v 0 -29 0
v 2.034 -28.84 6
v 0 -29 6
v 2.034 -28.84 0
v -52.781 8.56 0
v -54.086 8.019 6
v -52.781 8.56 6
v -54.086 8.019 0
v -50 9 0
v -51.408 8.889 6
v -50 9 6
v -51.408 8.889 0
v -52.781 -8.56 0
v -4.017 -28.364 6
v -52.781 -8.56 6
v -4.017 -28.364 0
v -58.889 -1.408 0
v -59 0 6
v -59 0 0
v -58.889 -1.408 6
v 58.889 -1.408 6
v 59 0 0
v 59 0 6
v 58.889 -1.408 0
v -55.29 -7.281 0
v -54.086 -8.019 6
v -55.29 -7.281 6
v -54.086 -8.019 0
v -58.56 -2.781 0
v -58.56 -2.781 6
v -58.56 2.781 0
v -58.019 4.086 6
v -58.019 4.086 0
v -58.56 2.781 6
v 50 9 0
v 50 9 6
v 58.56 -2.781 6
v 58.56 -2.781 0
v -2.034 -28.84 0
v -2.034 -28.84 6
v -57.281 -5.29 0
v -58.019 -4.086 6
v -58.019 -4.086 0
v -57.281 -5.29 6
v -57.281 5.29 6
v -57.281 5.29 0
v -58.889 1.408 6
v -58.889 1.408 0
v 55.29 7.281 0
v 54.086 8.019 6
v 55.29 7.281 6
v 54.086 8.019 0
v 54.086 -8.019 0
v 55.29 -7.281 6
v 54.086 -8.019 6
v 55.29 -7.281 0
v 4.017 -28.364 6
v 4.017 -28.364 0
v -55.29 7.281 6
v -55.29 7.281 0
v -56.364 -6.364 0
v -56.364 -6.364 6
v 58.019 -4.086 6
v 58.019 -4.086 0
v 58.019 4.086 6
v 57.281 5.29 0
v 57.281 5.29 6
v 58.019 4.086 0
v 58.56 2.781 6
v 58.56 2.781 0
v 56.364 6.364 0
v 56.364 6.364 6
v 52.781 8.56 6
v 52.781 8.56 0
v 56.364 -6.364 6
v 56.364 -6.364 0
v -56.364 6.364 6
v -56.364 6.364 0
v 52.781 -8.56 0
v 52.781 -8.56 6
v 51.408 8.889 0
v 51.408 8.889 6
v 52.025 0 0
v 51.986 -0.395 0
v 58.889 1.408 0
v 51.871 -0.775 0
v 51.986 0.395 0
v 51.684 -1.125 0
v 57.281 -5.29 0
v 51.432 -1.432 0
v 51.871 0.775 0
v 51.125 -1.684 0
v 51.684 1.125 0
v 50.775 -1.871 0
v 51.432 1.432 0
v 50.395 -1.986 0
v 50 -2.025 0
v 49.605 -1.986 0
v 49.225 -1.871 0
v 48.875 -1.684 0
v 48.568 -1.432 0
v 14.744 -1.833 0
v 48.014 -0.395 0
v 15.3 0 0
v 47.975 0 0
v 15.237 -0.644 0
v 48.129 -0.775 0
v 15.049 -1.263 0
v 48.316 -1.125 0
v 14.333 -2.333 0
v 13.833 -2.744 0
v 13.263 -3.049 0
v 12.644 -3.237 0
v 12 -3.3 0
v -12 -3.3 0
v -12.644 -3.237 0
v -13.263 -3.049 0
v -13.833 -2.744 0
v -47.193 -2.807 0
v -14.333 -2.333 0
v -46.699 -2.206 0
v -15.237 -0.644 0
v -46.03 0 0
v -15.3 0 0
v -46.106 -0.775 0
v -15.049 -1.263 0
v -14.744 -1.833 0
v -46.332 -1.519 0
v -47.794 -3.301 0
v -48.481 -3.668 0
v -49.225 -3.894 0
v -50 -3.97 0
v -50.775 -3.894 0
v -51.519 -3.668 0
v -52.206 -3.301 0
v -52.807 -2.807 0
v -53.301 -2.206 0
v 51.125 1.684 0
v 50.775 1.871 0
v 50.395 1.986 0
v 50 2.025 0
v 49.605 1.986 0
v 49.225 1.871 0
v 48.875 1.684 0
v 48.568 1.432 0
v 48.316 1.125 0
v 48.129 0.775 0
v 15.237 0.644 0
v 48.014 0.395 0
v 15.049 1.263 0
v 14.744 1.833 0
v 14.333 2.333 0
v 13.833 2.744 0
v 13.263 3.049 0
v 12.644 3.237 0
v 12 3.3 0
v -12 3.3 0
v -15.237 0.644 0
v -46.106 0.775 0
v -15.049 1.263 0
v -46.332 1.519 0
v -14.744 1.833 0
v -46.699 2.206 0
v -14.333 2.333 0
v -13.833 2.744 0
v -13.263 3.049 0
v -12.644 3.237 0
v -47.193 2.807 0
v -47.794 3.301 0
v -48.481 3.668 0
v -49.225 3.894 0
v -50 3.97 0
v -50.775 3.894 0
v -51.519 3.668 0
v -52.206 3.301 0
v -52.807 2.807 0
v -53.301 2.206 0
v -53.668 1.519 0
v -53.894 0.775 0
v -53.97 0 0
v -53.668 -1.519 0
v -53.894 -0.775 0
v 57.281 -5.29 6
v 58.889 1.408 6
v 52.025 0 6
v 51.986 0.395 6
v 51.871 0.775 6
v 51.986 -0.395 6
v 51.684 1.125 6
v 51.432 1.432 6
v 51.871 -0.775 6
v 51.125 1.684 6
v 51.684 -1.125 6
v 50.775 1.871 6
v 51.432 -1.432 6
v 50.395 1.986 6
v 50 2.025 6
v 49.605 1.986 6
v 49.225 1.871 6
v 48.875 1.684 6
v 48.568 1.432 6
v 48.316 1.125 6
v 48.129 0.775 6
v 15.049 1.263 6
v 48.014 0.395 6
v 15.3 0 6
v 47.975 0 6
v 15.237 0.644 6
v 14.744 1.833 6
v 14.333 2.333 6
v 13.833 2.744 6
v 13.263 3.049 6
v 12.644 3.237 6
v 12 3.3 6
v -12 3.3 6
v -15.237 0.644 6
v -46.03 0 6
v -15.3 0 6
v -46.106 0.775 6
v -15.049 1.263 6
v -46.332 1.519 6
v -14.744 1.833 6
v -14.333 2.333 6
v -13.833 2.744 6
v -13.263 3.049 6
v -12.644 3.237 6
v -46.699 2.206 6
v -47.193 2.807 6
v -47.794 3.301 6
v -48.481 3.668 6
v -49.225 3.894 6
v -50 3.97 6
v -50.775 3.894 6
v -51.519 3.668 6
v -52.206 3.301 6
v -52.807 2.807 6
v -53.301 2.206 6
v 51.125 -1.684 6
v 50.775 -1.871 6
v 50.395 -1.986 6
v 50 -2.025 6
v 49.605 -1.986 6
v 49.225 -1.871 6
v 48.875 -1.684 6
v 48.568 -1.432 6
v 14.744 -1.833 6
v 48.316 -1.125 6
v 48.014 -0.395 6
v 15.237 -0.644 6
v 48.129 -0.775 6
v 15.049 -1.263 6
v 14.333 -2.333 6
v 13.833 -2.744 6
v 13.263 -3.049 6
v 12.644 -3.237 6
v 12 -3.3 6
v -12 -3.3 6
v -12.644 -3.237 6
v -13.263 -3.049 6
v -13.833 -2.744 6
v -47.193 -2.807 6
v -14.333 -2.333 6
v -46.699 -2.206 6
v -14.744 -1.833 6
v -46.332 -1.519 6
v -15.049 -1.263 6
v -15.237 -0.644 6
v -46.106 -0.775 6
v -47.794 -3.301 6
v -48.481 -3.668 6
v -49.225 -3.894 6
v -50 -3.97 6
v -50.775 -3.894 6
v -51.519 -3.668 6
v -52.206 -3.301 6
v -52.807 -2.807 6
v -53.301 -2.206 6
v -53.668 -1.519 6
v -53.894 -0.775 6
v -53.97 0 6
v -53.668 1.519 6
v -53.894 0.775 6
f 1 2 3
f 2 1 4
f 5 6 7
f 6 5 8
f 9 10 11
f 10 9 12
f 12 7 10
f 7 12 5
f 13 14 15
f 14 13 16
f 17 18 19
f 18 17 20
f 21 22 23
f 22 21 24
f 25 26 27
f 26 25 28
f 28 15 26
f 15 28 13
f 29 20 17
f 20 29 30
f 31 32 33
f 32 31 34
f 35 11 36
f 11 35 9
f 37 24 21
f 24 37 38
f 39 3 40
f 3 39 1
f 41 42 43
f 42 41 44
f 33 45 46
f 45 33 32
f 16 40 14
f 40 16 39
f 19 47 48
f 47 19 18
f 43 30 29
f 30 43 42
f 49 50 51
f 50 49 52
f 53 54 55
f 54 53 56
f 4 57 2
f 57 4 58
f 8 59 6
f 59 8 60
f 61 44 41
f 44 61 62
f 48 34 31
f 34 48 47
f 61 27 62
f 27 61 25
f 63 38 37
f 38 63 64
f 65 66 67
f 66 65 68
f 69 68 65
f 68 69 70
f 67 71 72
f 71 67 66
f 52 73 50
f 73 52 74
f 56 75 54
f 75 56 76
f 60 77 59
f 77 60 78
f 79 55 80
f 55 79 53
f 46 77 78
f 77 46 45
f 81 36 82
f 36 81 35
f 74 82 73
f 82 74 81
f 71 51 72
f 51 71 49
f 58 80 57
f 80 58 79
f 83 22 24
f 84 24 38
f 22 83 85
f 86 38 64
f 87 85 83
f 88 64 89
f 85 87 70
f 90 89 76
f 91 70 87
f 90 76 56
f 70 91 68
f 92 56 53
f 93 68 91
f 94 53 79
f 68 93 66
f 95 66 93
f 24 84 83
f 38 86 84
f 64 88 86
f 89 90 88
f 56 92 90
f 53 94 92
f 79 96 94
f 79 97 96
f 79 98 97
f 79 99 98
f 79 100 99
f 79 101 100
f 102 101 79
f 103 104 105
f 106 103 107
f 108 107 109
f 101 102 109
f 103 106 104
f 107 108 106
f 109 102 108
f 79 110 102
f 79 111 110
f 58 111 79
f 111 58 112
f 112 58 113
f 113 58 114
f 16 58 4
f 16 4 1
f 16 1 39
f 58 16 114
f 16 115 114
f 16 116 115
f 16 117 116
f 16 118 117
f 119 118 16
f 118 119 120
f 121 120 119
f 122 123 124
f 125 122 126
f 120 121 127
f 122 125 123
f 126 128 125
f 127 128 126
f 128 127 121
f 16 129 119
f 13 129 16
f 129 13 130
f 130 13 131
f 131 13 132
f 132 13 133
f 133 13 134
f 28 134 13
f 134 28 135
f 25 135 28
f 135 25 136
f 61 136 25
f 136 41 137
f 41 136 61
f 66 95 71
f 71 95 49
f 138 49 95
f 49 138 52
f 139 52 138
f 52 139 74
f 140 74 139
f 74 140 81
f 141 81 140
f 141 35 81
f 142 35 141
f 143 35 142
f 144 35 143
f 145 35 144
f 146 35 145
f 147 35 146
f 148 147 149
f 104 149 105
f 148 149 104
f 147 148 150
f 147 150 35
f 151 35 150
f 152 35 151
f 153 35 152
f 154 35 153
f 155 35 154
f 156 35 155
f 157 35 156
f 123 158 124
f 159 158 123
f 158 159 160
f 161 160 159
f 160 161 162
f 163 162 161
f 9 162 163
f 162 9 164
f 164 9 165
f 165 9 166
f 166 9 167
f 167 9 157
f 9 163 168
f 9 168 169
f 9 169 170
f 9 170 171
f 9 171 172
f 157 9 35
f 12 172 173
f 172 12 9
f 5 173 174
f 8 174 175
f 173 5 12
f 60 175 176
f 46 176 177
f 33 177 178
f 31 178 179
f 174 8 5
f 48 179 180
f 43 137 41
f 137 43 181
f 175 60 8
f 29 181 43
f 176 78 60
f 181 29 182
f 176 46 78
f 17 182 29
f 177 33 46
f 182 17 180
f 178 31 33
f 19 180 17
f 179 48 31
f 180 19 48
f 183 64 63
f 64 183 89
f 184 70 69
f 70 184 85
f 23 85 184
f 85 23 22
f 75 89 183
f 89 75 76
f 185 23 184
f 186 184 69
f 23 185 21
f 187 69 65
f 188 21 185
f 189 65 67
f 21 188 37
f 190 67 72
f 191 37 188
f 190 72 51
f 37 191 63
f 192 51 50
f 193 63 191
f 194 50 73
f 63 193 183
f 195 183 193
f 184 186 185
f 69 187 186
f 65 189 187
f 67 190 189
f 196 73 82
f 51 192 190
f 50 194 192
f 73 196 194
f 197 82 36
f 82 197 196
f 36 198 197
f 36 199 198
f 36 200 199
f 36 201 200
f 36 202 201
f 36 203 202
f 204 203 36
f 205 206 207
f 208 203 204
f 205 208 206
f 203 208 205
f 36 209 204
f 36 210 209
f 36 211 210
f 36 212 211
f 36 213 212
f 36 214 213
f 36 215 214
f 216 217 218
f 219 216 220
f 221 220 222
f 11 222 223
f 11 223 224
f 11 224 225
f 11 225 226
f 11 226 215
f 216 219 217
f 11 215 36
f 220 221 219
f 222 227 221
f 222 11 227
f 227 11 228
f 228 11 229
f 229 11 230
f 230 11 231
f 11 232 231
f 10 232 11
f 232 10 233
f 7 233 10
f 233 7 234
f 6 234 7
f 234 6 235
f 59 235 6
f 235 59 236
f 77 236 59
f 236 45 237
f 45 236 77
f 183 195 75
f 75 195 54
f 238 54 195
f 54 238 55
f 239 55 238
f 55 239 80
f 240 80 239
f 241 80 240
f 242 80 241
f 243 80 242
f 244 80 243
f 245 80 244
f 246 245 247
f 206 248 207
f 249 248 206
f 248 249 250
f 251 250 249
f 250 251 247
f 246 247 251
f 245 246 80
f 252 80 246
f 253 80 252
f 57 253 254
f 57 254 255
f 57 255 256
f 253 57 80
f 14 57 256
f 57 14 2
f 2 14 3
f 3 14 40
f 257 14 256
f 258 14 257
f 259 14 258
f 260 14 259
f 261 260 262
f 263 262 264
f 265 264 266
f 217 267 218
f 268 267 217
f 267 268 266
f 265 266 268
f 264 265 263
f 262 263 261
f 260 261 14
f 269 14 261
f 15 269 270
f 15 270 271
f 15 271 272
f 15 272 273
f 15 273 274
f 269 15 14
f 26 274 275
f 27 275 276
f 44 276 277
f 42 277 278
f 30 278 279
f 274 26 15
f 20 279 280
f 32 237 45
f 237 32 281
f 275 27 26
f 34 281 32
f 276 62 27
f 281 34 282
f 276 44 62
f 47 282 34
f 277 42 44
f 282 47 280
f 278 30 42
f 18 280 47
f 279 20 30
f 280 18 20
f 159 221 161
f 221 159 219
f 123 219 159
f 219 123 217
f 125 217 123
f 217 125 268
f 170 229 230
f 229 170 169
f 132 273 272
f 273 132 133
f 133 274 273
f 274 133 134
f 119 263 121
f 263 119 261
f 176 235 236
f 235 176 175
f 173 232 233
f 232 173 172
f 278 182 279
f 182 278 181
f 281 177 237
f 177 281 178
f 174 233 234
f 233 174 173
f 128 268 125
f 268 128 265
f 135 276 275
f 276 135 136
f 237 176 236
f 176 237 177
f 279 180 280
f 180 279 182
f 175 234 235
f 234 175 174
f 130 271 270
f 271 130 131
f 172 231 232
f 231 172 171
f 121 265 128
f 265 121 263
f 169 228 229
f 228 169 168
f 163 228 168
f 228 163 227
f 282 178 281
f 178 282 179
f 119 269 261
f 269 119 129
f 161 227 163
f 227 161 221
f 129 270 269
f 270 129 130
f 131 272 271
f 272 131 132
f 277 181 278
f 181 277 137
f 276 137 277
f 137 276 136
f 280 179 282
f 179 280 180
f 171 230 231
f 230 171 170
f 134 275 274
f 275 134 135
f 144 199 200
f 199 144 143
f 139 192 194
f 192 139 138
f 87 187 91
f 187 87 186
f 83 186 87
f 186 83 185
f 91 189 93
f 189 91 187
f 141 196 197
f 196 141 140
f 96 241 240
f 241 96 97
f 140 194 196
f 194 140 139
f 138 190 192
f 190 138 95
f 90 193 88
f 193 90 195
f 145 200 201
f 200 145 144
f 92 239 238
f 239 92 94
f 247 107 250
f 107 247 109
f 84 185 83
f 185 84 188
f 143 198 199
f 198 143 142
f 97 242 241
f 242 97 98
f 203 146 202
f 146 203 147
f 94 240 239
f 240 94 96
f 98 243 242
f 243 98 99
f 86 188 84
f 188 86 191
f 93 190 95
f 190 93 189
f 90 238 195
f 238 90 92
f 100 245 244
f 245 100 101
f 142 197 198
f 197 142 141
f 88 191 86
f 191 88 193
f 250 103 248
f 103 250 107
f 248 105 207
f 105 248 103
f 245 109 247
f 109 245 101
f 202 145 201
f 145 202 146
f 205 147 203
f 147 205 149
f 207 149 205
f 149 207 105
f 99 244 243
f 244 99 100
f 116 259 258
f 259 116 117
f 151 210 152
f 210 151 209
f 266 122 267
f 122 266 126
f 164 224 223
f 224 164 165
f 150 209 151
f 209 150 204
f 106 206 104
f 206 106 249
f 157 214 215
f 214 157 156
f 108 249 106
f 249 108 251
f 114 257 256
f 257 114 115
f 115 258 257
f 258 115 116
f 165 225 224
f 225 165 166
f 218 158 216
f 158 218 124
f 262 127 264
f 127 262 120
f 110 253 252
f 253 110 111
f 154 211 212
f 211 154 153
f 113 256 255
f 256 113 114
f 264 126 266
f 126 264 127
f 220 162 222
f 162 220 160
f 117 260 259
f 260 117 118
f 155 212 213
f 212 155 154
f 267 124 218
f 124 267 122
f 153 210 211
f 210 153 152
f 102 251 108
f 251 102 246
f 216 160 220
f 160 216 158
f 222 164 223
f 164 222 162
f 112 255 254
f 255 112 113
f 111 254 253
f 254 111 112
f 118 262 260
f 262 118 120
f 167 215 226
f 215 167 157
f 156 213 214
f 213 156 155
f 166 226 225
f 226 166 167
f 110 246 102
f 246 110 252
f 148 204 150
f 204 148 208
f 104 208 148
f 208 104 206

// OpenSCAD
$fn = 32;

// ----------------------------------------------------------------------
// Lever: 100 mm between the bosses, 6 mm thick, smooth outline
// ----------------------------------------------------------------------

// --- parameters (mm) ---
lever_l = 100;            // distance between the boss centres
boss_a = 18;              // first boss diameter
boss_b = 18;              // second boss diameter
bore_a = 7.94;            // first bore
bore_b = 4.05;            // second bore
lever_t = 6;              // lever thickness
boss_c = 26;              // middle boss diameter
bend = 16;                // how far the middle boss drops
slot_w = 6.6;             // adjustment slot width

lever_profile = [[-59, 0], [-58.889, -1.408], [-58.56, -2.781], [-58.019, -4.086], [-57.281, -5.29], [-56.364, -6.364], [-55.29, -7.281], [-54.086, -8.019], [-52.781, -8.56], [-4.017, -28.364], [-2.034, -28.84], [0, -29], [2.034, -28.84], [4.017, -28.364], [52.781, -8.56], [54.086, -8.019], [55.29, -7.281], [56.364, -6.364], [57.281, -5.29], [58.019, -4.086], [58.56, -2.781], [58.889, -1.408], [59, 0], [58.889, 1.408], [58.56, 2.781], [58.019, 4.086], [57.281, 5.29], [56.364, 6.364], [55.29, 7.281], [54.086, 8.019], [52.781, 8.56], [51.408, 8.889], [50, 9], [-50, 9], [-51.408, 8.889], [-52.781, 8.56], [-54.086, 8.019], [-55.29, 7.281], [-56.364, 6.364], [-57.281, 5.29], [-58.019, 4.086], [-58.56, 2.781], [-58.889, 1.408]];

difference() {
  linear_extrude(height = lever_t) polygon(lever_profile);
  translate([-50, 0, -2.5]) cylinder(h = lever_t + 5, d = bore_a);
  translate([50, 0, -2.5]) cylinder(h = lever_t + 5, d = bore_b);
  /* slotted adjustment, stadium shaped */
  hull() {
    translate([-12, 0, -2.5]) cylinder(h = lever_t + 5, d = slot_w);
    translate([12, 0, -2.5]) cylinder(h = lever_t + 5, d = slot_w);
  }
}
